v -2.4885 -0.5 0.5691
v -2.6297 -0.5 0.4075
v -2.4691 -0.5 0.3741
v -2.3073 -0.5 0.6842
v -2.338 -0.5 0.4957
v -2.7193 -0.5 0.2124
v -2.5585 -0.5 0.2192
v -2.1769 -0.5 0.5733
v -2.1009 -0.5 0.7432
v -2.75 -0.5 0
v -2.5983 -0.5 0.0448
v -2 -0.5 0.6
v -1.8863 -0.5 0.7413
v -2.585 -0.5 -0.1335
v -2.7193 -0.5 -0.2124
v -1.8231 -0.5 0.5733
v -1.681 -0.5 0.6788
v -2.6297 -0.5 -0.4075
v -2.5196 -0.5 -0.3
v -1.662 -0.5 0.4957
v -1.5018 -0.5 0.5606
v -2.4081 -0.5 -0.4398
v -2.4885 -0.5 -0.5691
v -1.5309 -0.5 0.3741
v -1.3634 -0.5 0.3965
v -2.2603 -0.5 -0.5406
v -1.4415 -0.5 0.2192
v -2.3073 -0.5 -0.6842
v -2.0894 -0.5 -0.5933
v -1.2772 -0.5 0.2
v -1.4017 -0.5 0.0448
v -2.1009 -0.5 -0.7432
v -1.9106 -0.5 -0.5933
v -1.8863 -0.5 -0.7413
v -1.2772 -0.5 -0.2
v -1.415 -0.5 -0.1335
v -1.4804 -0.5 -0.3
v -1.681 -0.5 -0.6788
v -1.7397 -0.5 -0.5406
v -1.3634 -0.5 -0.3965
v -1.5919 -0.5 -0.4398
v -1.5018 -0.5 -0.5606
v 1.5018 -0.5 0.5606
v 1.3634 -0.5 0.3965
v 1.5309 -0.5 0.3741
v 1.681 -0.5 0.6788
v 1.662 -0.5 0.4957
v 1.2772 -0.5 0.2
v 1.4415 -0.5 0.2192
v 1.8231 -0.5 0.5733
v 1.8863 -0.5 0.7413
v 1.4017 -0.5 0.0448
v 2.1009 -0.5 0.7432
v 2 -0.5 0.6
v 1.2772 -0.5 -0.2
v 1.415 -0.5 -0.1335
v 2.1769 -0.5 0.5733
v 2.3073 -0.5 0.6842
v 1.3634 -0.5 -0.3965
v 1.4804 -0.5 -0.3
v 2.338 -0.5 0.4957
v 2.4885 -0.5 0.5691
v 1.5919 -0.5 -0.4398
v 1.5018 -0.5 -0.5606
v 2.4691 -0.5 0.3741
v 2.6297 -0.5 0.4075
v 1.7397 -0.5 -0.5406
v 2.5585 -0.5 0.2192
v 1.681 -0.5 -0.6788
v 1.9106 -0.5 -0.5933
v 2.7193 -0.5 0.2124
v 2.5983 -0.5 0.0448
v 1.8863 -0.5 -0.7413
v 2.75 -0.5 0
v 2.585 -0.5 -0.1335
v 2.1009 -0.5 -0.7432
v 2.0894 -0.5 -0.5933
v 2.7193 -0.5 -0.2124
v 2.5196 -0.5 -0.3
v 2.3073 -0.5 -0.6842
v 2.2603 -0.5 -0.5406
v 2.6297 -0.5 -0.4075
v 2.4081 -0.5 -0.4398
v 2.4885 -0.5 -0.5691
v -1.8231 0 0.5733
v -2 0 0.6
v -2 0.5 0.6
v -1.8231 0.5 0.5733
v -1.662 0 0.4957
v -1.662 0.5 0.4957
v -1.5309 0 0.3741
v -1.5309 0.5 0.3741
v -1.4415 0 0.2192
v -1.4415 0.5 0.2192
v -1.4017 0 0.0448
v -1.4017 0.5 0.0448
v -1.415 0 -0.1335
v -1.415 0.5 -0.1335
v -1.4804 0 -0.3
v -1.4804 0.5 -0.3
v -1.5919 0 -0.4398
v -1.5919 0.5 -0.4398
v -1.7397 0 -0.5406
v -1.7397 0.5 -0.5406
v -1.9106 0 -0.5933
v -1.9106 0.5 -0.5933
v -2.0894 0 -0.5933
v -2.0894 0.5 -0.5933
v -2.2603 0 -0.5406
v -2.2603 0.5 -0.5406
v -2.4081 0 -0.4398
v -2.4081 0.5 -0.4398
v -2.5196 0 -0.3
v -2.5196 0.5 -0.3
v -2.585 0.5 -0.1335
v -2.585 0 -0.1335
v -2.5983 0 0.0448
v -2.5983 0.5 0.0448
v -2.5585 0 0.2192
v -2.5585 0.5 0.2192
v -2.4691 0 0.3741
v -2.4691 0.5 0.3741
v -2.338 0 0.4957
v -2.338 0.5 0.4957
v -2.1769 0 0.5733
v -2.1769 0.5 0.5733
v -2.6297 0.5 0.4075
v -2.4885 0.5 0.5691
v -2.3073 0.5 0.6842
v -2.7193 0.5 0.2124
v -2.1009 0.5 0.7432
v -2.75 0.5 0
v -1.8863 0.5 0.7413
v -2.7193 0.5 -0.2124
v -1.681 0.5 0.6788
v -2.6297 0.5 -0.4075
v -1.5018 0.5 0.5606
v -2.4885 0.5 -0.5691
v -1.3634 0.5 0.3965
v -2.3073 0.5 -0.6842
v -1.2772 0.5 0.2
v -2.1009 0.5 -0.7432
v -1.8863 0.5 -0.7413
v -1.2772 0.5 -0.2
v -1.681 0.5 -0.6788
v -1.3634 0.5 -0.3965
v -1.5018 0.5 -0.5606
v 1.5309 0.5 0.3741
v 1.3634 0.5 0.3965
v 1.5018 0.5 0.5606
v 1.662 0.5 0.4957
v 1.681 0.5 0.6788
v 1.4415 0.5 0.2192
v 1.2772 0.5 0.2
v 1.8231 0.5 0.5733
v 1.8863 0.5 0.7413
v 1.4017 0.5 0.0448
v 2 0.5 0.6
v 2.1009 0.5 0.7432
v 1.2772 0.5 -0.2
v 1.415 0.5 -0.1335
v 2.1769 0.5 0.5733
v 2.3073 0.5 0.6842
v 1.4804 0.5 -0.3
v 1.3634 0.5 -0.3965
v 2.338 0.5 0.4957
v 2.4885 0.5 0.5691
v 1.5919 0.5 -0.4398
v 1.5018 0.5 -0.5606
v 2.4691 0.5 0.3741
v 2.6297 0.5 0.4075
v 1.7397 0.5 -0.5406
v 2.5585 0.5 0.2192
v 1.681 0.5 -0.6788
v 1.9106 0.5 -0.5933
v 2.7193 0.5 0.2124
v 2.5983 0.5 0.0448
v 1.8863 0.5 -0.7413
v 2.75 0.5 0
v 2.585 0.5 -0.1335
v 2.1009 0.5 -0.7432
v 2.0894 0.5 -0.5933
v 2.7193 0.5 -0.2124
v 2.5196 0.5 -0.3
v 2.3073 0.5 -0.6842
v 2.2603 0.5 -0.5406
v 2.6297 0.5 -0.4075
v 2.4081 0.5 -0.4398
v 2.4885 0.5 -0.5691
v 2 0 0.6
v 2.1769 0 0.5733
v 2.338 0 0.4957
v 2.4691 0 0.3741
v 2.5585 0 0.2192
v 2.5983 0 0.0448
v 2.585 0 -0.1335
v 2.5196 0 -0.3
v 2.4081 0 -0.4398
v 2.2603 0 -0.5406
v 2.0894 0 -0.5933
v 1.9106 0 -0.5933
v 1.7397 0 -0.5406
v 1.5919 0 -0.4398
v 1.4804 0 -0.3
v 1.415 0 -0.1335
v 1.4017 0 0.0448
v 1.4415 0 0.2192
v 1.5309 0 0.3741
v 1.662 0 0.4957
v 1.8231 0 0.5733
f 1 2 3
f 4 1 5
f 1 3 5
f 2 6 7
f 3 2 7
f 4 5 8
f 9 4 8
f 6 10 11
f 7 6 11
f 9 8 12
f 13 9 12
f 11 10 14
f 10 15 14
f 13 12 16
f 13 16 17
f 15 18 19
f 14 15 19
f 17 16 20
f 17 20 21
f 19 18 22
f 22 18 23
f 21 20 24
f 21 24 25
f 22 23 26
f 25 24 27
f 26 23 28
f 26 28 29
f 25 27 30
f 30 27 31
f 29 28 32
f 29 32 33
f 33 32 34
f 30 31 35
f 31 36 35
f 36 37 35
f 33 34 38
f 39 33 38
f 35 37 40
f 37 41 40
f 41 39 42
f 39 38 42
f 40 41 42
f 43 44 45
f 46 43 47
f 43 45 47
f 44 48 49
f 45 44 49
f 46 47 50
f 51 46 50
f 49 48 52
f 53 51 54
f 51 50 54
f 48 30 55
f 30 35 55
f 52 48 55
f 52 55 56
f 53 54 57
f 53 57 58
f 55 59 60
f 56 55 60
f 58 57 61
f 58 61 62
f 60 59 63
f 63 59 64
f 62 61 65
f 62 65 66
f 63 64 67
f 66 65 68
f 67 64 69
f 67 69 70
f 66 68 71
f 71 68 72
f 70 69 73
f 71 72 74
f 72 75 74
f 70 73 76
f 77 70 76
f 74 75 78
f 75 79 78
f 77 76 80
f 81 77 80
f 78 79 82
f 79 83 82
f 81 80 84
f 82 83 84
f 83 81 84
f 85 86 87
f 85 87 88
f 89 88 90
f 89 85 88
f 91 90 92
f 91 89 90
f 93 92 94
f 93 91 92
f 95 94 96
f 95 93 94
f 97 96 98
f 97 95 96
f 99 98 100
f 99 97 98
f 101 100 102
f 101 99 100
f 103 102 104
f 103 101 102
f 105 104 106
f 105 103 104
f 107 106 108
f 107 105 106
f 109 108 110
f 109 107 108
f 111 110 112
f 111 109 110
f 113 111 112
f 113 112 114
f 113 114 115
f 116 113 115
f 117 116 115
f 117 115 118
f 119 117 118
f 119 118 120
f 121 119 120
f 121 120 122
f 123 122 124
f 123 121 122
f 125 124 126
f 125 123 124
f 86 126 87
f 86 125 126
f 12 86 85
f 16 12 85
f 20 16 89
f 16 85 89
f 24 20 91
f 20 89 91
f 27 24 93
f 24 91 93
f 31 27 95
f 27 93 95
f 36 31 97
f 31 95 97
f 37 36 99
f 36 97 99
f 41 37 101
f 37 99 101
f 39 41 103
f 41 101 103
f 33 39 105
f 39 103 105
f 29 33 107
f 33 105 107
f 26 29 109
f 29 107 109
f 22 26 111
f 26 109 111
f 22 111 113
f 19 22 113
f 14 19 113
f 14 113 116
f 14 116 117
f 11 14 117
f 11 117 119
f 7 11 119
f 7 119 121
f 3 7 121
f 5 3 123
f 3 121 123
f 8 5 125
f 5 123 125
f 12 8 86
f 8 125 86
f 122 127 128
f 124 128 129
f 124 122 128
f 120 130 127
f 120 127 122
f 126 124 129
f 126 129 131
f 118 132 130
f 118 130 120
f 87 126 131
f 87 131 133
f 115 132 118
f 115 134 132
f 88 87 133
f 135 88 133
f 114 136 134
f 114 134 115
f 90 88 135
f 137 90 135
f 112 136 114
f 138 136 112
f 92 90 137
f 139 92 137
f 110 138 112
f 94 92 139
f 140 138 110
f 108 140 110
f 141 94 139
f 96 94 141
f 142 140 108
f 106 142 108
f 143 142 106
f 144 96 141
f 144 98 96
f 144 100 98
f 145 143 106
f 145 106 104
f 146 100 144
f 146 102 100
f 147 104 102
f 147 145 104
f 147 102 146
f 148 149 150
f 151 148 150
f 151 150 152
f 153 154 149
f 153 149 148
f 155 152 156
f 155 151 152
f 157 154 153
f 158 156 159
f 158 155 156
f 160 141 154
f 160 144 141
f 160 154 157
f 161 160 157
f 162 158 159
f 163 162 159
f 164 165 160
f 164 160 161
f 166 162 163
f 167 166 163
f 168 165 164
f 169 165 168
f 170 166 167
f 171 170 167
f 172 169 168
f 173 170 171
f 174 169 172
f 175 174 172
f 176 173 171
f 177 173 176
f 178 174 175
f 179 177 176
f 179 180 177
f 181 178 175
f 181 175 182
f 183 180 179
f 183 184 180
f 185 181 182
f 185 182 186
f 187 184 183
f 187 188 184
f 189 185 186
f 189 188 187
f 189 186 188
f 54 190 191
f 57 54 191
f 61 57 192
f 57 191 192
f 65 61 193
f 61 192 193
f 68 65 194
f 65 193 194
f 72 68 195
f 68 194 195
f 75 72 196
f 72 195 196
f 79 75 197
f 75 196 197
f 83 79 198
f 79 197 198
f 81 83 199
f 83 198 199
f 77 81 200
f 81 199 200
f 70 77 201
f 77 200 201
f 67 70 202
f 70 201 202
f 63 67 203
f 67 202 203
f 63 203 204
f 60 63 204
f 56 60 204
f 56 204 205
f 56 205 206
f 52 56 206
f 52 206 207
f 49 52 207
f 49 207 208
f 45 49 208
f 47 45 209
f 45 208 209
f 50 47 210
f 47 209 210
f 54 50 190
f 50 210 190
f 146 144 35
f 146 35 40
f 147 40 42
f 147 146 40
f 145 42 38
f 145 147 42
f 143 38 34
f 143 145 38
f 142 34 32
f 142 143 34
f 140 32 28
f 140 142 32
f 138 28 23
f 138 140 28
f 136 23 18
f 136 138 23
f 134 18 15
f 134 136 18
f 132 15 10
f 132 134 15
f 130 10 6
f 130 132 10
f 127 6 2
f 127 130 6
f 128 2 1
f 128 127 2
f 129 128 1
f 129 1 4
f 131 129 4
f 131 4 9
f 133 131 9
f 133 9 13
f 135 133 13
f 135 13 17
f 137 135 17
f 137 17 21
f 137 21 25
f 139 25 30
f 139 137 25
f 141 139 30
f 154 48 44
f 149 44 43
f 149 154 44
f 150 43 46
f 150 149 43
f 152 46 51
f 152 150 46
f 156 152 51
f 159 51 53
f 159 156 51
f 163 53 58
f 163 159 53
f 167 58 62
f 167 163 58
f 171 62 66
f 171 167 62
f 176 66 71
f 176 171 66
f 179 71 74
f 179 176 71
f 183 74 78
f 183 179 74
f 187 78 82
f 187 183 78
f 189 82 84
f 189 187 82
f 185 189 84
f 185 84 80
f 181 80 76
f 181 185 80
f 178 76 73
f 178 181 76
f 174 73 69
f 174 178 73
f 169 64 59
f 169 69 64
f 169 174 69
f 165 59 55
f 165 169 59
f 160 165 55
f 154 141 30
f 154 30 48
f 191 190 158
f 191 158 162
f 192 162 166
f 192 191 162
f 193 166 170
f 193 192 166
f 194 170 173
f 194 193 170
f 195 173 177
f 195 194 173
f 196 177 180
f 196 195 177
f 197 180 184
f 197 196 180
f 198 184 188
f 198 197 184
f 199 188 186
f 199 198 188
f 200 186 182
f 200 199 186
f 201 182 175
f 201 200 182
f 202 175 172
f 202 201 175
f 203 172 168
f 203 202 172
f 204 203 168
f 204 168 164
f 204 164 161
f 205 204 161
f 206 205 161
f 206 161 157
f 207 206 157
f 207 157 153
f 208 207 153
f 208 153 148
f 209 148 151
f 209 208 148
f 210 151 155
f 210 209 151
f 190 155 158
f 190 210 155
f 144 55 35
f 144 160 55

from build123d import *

# Parameters (mm, degrees)
SKETCH_1_R      = 0.75
SKETCH_1_R_2    = 0.6
EXTRUDE_1_DEPTH = 0.5


with BuildPart() as part:
    # 草图1 → 凸台-拉伸1 (new, symmetric)
    # profile 1 of 3: a face of its own
    with BuildSketch(Plane(origin=(0, 0, 0), x_dir=(1, 0, 0), z_dir=(0, 1, 0))):
        with BuildLine():
            Line((1.277158385, 0.2), (-1.277158385, 0.2))
            ThreePointArc((-1.277158385, 0.2), (-1.25682061, 0.100917761), (-1.25, 0))
            ThreePointArc((-1.25, 0), (-1.25682061, -0.100917761), (-1.277158385, -0.2))
            Line((-1.277158385, -0.2), (1.277158385, -0.2))
            ThreePointArc((1.277158385, -0.2), (1.25, 0), (1.277158385, 0.2))
        make_face()
    # profile 2 of 3: a face of its own
    with BuildSketch(Plane(origin=(0, 0, 0), x_dir=(1, 0, 0), z_dir=(0, 1, 0))):
        with Locations((2, 0)):
            Circle(SKETCH_1_R)
        with Locations(Location((2, 0, 0), (0, 0, 270))):
            Circle(SKETCH_1_R_2, mode=Mode.SUBTRACT)
    # profile 3 of 3: a face of its own
    with BuildSketch(Plane(origin=(0, 0, 0), x_dir=(1, 0, 0), z_dir=(0, 1, 0))):
        with Locations((-2, 0)):
            Circle(SKETCH_1_R)
        with Locations(Location((-2, 0, 0), (0, 0, 270))):
            Circle(SKETCH_1_R_2, mode=Mode.SUBTRACT)
    extrude(amount=EXTRUDE_1_DEPTH, both=True)


solid = part.part
